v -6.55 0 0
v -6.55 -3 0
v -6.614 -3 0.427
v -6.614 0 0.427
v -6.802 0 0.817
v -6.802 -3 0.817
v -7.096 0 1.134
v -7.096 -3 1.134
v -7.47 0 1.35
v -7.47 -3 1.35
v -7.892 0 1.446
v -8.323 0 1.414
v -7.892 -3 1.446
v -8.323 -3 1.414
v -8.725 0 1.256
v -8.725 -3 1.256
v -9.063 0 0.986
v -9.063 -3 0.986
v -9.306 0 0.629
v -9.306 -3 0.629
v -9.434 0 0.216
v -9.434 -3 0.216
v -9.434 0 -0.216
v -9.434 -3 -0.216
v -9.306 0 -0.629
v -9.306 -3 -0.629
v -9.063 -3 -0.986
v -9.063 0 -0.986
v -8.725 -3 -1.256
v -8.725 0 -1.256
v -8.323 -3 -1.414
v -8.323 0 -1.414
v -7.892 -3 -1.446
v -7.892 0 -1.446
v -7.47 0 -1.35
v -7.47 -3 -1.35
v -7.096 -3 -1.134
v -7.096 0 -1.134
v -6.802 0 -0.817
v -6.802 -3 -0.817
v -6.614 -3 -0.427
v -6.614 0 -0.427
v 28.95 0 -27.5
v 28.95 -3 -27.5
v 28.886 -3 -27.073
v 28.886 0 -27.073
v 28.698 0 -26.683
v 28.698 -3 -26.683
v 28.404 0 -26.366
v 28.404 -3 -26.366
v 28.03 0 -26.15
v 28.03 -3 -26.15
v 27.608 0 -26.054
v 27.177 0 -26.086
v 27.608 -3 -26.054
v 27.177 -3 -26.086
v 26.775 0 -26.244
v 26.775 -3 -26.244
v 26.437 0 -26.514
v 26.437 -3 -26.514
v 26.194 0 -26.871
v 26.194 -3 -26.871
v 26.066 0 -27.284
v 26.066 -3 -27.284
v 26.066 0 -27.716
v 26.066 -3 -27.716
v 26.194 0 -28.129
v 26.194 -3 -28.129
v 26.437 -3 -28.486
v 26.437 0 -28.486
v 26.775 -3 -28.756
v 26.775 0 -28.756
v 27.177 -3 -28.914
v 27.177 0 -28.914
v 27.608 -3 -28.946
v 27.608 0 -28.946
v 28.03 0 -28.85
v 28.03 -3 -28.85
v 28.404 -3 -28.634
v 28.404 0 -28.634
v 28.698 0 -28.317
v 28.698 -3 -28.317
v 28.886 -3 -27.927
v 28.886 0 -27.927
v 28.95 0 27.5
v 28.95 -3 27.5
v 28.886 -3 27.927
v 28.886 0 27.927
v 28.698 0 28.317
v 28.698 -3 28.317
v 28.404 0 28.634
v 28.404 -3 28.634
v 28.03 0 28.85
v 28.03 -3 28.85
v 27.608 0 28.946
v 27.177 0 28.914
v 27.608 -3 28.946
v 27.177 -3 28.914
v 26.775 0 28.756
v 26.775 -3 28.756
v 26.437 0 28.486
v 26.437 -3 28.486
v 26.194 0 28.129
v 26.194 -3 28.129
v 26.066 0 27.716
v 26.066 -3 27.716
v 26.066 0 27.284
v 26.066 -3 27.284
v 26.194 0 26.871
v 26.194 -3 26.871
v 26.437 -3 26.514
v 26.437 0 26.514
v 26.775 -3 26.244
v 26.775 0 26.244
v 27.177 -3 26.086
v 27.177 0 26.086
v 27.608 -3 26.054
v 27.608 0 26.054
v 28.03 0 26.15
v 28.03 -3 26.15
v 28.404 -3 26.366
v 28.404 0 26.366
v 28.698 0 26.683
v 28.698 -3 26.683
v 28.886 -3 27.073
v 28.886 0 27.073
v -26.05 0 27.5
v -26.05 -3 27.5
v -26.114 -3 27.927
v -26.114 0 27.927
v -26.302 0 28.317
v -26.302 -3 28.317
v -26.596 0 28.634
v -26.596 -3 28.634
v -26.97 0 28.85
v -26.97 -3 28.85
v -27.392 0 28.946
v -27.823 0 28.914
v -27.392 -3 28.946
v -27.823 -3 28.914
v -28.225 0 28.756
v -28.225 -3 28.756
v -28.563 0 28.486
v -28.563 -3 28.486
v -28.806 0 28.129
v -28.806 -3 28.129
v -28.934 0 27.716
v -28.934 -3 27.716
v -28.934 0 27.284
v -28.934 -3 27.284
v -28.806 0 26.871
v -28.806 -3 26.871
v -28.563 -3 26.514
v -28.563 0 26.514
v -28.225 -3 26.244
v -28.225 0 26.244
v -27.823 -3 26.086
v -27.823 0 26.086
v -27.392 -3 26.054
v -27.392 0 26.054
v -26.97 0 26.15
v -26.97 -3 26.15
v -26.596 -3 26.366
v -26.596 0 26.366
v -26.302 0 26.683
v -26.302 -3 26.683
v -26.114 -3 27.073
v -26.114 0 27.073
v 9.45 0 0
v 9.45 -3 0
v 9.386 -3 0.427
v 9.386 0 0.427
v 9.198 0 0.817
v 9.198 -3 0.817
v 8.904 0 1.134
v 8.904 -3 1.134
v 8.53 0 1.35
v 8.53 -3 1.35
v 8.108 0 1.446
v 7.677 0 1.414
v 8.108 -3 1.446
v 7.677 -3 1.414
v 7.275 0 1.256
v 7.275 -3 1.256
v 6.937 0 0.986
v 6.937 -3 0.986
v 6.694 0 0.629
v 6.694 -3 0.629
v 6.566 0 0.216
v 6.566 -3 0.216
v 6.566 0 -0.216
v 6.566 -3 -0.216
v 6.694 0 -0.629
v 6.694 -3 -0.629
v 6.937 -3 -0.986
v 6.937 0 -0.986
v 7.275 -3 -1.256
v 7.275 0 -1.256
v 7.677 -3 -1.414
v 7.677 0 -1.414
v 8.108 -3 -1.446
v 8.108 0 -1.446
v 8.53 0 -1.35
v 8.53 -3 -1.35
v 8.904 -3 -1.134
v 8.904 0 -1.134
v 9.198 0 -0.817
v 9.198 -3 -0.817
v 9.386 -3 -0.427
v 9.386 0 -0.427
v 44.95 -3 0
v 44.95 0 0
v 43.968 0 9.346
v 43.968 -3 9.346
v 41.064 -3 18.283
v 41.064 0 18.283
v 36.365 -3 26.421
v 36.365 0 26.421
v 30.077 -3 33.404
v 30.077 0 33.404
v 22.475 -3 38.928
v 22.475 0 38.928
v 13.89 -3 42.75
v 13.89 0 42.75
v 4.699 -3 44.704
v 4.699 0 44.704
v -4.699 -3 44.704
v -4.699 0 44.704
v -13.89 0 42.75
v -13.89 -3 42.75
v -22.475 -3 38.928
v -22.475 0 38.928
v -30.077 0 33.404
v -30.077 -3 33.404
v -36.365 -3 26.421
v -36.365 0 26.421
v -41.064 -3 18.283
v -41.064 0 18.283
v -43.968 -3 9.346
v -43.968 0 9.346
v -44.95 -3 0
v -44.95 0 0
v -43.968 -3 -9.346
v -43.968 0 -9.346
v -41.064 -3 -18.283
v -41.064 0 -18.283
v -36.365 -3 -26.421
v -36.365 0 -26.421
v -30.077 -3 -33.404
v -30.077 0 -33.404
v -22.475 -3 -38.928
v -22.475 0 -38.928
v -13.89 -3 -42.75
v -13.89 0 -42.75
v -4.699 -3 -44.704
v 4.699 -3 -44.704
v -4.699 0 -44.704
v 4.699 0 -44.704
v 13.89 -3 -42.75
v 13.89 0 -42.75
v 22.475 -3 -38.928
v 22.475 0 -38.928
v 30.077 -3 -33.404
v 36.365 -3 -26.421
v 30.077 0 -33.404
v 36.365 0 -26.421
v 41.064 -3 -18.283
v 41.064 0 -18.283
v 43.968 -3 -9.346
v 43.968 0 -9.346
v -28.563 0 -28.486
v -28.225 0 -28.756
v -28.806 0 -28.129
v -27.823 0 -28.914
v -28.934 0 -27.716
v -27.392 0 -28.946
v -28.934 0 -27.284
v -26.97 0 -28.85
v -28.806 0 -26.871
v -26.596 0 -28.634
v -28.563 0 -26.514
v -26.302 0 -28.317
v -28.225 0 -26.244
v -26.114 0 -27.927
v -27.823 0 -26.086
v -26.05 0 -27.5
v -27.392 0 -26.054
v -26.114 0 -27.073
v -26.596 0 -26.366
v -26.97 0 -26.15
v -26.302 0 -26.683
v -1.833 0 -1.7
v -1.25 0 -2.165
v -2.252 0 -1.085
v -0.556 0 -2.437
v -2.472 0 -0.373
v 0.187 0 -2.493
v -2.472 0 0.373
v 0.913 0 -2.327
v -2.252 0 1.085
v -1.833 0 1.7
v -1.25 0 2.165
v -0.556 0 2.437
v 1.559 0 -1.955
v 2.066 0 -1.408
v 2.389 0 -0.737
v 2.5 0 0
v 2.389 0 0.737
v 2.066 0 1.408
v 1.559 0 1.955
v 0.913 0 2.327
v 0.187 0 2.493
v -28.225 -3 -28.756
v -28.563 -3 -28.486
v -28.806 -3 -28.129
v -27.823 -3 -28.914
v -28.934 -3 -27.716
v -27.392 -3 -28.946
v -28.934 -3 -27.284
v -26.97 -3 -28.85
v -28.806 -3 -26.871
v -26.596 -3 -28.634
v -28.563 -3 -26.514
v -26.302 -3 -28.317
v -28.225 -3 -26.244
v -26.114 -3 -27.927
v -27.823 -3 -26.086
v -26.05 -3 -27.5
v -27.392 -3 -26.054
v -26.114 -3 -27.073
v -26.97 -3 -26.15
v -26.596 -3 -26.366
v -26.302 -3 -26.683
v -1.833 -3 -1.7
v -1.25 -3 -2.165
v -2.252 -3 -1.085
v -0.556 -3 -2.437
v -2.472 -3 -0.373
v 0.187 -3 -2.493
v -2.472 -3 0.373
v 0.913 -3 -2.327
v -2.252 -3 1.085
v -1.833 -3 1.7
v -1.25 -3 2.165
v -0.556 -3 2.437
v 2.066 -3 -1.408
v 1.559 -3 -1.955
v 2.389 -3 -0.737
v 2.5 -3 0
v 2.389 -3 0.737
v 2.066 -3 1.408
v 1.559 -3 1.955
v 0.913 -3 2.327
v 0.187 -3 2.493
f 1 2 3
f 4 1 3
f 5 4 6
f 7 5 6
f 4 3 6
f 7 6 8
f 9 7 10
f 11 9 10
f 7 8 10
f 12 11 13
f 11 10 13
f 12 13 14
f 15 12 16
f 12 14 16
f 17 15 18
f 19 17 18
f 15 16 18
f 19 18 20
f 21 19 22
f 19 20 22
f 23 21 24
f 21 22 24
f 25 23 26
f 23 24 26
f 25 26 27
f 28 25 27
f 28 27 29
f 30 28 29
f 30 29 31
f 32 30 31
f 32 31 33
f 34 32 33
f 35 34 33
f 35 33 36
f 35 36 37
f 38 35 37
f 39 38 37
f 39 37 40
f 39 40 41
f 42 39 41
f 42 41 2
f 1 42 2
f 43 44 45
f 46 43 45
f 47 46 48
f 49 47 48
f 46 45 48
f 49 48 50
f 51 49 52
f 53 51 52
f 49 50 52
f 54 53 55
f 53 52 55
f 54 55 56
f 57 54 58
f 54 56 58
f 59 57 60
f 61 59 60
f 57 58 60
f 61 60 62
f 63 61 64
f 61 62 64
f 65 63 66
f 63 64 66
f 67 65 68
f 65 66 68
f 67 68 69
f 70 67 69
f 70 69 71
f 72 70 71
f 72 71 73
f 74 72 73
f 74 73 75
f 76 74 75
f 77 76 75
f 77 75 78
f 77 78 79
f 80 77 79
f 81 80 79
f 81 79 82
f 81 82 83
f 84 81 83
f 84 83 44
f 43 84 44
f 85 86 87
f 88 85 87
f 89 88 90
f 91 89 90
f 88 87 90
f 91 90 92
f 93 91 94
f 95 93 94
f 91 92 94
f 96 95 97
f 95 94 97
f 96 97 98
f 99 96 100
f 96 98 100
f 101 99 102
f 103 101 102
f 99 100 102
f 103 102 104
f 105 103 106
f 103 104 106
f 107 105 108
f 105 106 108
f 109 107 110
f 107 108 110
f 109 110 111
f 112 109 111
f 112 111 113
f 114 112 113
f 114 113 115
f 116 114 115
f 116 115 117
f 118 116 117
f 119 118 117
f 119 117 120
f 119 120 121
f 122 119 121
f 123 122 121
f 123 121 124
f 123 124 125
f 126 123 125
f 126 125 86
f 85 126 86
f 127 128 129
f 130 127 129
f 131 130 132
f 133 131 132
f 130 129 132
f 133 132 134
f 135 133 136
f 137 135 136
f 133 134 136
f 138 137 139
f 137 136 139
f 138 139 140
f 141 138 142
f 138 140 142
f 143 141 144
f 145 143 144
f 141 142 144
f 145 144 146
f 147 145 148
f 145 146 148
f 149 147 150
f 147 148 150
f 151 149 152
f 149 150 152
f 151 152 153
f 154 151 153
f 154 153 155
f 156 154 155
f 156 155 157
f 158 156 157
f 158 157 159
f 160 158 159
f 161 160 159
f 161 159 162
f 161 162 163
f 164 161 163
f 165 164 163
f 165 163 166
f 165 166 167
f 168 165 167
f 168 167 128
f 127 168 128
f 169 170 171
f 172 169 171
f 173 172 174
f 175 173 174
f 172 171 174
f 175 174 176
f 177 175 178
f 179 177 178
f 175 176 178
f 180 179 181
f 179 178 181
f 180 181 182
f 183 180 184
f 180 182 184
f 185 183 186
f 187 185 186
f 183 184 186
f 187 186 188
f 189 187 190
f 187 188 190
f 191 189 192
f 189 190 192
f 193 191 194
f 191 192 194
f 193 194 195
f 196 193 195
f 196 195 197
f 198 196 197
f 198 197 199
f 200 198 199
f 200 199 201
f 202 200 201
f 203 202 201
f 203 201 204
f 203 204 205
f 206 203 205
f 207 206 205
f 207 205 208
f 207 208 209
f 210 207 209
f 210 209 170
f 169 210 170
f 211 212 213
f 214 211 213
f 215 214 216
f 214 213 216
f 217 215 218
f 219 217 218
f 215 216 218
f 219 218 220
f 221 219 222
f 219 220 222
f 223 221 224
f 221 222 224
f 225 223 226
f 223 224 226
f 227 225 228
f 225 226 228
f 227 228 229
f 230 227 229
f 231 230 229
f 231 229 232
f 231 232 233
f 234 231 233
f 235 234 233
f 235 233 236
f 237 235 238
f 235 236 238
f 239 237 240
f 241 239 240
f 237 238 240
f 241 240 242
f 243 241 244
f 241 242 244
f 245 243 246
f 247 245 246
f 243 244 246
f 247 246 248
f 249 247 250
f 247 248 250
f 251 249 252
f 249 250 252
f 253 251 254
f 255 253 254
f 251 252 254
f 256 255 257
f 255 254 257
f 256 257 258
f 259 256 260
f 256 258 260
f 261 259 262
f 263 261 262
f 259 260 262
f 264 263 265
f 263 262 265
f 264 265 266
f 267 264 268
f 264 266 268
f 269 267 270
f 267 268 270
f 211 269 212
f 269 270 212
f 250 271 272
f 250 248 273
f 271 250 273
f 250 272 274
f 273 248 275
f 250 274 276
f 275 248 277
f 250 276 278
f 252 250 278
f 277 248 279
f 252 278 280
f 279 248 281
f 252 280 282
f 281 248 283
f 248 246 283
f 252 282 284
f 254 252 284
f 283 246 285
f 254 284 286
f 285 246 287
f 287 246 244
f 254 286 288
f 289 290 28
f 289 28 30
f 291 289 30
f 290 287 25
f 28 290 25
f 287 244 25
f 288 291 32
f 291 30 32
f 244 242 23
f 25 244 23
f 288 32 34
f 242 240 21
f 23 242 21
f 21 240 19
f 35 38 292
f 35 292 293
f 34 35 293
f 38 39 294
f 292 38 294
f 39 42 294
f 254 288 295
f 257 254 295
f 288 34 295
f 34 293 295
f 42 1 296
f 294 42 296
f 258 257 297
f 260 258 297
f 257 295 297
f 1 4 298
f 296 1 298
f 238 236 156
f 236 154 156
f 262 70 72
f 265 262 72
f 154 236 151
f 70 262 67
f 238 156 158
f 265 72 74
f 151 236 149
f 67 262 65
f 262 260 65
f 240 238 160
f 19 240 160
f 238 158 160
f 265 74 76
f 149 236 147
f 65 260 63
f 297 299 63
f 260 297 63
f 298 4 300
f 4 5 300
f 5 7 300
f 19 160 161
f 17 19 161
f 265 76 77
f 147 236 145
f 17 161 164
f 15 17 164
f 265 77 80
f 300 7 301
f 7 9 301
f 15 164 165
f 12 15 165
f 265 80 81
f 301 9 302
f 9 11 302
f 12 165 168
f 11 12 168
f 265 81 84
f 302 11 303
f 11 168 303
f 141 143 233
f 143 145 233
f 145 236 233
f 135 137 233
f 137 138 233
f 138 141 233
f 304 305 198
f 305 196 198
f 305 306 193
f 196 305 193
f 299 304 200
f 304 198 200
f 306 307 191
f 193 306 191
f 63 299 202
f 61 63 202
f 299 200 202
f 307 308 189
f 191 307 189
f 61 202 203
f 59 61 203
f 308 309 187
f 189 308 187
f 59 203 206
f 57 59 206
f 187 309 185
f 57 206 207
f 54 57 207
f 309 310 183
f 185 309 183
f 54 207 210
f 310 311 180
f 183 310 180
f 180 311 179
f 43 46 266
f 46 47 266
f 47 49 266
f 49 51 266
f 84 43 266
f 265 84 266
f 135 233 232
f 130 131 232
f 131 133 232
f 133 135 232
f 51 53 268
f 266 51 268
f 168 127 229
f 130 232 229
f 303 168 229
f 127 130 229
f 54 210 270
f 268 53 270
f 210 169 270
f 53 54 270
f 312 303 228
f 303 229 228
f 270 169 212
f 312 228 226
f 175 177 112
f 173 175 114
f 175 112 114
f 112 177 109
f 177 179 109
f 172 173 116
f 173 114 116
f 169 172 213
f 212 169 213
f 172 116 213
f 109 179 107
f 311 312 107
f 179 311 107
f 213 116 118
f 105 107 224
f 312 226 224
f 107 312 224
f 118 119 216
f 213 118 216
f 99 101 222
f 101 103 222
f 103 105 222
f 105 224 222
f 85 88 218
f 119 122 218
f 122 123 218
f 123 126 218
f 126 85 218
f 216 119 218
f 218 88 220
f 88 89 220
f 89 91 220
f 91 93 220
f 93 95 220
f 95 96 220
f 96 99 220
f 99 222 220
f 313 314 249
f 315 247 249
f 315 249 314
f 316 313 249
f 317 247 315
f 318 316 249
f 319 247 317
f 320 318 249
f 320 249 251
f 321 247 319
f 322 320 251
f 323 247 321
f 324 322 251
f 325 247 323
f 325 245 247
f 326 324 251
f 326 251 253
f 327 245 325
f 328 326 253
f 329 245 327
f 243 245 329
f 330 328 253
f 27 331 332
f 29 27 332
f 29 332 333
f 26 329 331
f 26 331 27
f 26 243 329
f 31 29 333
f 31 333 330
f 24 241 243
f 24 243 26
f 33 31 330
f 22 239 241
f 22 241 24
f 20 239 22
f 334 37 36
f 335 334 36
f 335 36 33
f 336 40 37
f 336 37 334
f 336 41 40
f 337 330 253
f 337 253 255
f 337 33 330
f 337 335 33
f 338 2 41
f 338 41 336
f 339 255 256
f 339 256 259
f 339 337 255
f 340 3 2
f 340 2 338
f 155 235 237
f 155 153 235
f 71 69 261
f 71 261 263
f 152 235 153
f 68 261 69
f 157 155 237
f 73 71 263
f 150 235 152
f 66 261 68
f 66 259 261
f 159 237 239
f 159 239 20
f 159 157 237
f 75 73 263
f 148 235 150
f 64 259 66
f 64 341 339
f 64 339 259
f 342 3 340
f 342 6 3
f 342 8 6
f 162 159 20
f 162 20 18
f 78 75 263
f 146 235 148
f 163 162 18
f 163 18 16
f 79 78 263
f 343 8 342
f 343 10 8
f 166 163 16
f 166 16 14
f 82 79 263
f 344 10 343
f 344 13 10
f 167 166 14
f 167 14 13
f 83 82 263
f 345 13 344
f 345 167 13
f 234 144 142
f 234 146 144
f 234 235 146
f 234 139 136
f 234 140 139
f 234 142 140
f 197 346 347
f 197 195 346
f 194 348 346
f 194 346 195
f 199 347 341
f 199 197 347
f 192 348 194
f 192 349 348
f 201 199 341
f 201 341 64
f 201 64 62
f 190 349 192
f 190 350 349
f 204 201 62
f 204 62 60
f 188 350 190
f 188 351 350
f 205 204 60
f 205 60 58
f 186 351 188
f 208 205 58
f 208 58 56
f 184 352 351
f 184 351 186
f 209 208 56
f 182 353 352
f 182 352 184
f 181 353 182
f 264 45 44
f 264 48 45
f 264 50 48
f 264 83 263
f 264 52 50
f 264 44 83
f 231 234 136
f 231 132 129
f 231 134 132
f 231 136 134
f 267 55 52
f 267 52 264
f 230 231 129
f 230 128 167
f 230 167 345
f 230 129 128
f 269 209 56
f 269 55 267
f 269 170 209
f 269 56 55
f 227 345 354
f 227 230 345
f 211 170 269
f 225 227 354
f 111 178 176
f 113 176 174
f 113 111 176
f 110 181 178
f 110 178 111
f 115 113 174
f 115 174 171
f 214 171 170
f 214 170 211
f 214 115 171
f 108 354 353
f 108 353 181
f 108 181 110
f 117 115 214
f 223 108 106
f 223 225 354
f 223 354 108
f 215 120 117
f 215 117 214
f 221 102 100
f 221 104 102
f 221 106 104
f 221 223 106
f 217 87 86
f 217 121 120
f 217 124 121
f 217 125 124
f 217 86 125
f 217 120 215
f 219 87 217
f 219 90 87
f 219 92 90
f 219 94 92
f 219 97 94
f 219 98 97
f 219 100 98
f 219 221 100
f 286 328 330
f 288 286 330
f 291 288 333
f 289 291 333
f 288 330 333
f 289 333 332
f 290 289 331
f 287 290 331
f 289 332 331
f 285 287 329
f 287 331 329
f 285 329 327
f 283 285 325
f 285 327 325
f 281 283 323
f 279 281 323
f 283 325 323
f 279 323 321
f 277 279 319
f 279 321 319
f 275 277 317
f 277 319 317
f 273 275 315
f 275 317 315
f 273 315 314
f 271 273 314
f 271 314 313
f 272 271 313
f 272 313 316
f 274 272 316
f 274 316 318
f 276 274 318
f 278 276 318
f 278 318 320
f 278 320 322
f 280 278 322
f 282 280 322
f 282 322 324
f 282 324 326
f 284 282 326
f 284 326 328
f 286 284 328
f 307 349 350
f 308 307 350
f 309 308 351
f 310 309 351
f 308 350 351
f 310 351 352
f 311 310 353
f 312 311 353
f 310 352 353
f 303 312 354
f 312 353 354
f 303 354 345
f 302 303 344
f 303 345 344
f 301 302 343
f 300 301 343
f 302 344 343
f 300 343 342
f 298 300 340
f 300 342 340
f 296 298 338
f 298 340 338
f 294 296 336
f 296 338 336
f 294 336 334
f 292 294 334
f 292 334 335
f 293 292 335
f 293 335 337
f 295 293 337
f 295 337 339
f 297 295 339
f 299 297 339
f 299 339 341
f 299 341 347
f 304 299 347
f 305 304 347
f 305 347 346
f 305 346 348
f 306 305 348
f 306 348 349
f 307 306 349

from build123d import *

# Parameters (mm, degrees)
F0_R     = 44.95
F1_DEPTH = 3
F2_R     = 1.45
F2_R_2   = 2.5
F3_DEPTH = 3.001
F4_R     = 1.45
F5_DEPTH = 3.001


with BuildPart() as f1:
    # F0 (on Front) → F1 (new body)
    with BuildSketch(Plane.XZ):
        Circle(F0_R)
    extrude(amount=F1_DEPTH)

    # F2 (on face) → F3 (cut, through all)
    with BuildSketch(Plane.XZ.offset(3)):
        with Locations((-8, 0)):
            Circle(F2_R)
        with Locations((8, 0)):
            Circle(F2_R)
        Circle(F2_R_2)
    extrude(amount=-F3_DEPTH, mode=Mode.SUBTRACT)

    # F4 (on face) → F5 (cut, through all)
    with BuildSketch(Plane.XZ.offset(3)):
        with Locations((-27.5, 27.5)):
            Circle(F4_R)
        with Locations((27.5, 27.5)):
            Circle(F4_R)
        with Locations((-27.5, -27.5)):
            Circle(F4_R)
        with Locations((27.5, -27.5)):
            Circle(F4_R)
    extrude(amount=-F5_DEPTH, mode=Mode.SUBTRACT)


solid = f1.part
